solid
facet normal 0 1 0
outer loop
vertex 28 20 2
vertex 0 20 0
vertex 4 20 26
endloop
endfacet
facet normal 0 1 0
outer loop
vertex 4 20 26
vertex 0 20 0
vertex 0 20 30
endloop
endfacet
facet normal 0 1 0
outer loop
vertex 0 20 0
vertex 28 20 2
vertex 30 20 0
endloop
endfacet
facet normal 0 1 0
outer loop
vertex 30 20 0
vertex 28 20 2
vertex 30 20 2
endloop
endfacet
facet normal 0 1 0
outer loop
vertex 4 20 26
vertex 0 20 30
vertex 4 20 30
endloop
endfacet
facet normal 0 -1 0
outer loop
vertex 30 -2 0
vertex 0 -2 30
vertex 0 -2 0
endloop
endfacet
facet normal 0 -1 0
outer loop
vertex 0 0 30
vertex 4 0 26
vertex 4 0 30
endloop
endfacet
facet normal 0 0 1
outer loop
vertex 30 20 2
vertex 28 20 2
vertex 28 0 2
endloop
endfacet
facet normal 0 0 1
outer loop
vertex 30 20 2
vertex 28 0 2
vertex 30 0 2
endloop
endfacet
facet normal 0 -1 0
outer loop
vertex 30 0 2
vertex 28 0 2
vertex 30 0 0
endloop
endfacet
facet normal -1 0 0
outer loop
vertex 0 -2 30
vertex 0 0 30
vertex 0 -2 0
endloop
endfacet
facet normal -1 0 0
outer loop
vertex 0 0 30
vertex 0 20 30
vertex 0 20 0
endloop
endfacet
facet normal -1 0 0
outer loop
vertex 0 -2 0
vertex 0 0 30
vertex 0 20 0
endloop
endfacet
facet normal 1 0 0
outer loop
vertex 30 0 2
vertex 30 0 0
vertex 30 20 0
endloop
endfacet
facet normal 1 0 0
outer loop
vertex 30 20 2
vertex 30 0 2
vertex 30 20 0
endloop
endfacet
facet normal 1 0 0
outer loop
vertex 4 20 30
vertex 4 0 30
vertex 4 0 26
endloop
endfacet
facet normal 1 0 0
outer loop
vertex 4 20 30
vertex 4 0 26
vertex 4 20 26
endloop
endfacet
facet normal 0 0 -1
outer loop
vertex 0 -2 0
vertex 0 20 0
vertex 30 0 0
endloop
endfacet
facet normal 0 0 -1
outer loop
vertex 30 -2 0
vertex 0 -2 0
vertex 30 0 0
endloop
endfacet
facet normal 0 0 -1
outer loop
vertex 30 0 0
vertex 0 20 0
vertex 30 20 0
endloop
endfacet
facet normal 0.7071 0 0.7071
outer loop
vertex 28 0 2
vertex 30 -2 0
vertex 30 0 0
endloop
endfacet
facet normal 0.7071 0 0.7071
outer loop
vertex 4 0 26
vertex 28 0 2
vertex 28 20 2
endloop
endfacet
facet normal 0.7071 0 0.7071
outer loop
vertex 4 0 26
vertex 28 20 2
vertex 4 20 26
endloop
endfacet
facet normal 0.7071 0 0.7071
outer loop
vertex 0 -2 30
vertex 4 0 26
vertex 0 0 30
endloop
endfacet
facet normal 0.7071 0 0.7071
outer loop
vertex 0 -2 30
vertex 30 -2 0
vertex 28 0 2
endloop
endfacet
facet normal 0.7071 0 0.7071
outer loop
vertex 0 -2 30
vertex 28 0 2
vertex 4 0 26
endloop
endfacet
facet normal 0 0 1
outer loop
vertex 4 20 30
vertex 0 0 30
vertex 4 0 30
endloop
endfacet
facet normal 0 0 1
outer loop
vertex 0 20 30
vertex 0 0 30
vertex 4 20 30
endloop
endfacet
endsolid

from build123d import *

# Parameters (mm, degrees)
F1_W     = 20
F1_H     = 30
F2_DEPTH = 4
F4_DEPTH = 2
F5_E7_W  = 30
F5_E7_H  = 20
F6_DEPTH = 2
F7_DEPTH = 20


with BuildPart() as f2:
    # F1 (on Right) → F2 (new body)
    with BuildSketch(Plane.YZ):
        with Locations((10, 15)):
            Rectangle(F1_W, F1_H)
    extrude(amount=F2_DEPTH)

    # F0 (on Front) → F4 (join)
    with BuildSketch(Plane.XZ):
        Polygon((0, 30), (0, 0), (30, 0), align=None)
    extrude(amount=F4_DEPTH)

    # F5_E7 (on explicit) → F6 (join)
    with BuildSketch(Plane.XY):
        with Locations((15, 10)):
            Rectangle(F5_E7_W, F5_E7_H)
    extrude(amount=F6_DEPTH)

    # F7 (add): a face of the model
    f7_faces = [f2.faces().sort_by_distance(p)[0] for p in [
        (12, 0, 10),
    ]]
    extrude(f7_faces, amount=F7_DEPTH)


solid = f2.part
